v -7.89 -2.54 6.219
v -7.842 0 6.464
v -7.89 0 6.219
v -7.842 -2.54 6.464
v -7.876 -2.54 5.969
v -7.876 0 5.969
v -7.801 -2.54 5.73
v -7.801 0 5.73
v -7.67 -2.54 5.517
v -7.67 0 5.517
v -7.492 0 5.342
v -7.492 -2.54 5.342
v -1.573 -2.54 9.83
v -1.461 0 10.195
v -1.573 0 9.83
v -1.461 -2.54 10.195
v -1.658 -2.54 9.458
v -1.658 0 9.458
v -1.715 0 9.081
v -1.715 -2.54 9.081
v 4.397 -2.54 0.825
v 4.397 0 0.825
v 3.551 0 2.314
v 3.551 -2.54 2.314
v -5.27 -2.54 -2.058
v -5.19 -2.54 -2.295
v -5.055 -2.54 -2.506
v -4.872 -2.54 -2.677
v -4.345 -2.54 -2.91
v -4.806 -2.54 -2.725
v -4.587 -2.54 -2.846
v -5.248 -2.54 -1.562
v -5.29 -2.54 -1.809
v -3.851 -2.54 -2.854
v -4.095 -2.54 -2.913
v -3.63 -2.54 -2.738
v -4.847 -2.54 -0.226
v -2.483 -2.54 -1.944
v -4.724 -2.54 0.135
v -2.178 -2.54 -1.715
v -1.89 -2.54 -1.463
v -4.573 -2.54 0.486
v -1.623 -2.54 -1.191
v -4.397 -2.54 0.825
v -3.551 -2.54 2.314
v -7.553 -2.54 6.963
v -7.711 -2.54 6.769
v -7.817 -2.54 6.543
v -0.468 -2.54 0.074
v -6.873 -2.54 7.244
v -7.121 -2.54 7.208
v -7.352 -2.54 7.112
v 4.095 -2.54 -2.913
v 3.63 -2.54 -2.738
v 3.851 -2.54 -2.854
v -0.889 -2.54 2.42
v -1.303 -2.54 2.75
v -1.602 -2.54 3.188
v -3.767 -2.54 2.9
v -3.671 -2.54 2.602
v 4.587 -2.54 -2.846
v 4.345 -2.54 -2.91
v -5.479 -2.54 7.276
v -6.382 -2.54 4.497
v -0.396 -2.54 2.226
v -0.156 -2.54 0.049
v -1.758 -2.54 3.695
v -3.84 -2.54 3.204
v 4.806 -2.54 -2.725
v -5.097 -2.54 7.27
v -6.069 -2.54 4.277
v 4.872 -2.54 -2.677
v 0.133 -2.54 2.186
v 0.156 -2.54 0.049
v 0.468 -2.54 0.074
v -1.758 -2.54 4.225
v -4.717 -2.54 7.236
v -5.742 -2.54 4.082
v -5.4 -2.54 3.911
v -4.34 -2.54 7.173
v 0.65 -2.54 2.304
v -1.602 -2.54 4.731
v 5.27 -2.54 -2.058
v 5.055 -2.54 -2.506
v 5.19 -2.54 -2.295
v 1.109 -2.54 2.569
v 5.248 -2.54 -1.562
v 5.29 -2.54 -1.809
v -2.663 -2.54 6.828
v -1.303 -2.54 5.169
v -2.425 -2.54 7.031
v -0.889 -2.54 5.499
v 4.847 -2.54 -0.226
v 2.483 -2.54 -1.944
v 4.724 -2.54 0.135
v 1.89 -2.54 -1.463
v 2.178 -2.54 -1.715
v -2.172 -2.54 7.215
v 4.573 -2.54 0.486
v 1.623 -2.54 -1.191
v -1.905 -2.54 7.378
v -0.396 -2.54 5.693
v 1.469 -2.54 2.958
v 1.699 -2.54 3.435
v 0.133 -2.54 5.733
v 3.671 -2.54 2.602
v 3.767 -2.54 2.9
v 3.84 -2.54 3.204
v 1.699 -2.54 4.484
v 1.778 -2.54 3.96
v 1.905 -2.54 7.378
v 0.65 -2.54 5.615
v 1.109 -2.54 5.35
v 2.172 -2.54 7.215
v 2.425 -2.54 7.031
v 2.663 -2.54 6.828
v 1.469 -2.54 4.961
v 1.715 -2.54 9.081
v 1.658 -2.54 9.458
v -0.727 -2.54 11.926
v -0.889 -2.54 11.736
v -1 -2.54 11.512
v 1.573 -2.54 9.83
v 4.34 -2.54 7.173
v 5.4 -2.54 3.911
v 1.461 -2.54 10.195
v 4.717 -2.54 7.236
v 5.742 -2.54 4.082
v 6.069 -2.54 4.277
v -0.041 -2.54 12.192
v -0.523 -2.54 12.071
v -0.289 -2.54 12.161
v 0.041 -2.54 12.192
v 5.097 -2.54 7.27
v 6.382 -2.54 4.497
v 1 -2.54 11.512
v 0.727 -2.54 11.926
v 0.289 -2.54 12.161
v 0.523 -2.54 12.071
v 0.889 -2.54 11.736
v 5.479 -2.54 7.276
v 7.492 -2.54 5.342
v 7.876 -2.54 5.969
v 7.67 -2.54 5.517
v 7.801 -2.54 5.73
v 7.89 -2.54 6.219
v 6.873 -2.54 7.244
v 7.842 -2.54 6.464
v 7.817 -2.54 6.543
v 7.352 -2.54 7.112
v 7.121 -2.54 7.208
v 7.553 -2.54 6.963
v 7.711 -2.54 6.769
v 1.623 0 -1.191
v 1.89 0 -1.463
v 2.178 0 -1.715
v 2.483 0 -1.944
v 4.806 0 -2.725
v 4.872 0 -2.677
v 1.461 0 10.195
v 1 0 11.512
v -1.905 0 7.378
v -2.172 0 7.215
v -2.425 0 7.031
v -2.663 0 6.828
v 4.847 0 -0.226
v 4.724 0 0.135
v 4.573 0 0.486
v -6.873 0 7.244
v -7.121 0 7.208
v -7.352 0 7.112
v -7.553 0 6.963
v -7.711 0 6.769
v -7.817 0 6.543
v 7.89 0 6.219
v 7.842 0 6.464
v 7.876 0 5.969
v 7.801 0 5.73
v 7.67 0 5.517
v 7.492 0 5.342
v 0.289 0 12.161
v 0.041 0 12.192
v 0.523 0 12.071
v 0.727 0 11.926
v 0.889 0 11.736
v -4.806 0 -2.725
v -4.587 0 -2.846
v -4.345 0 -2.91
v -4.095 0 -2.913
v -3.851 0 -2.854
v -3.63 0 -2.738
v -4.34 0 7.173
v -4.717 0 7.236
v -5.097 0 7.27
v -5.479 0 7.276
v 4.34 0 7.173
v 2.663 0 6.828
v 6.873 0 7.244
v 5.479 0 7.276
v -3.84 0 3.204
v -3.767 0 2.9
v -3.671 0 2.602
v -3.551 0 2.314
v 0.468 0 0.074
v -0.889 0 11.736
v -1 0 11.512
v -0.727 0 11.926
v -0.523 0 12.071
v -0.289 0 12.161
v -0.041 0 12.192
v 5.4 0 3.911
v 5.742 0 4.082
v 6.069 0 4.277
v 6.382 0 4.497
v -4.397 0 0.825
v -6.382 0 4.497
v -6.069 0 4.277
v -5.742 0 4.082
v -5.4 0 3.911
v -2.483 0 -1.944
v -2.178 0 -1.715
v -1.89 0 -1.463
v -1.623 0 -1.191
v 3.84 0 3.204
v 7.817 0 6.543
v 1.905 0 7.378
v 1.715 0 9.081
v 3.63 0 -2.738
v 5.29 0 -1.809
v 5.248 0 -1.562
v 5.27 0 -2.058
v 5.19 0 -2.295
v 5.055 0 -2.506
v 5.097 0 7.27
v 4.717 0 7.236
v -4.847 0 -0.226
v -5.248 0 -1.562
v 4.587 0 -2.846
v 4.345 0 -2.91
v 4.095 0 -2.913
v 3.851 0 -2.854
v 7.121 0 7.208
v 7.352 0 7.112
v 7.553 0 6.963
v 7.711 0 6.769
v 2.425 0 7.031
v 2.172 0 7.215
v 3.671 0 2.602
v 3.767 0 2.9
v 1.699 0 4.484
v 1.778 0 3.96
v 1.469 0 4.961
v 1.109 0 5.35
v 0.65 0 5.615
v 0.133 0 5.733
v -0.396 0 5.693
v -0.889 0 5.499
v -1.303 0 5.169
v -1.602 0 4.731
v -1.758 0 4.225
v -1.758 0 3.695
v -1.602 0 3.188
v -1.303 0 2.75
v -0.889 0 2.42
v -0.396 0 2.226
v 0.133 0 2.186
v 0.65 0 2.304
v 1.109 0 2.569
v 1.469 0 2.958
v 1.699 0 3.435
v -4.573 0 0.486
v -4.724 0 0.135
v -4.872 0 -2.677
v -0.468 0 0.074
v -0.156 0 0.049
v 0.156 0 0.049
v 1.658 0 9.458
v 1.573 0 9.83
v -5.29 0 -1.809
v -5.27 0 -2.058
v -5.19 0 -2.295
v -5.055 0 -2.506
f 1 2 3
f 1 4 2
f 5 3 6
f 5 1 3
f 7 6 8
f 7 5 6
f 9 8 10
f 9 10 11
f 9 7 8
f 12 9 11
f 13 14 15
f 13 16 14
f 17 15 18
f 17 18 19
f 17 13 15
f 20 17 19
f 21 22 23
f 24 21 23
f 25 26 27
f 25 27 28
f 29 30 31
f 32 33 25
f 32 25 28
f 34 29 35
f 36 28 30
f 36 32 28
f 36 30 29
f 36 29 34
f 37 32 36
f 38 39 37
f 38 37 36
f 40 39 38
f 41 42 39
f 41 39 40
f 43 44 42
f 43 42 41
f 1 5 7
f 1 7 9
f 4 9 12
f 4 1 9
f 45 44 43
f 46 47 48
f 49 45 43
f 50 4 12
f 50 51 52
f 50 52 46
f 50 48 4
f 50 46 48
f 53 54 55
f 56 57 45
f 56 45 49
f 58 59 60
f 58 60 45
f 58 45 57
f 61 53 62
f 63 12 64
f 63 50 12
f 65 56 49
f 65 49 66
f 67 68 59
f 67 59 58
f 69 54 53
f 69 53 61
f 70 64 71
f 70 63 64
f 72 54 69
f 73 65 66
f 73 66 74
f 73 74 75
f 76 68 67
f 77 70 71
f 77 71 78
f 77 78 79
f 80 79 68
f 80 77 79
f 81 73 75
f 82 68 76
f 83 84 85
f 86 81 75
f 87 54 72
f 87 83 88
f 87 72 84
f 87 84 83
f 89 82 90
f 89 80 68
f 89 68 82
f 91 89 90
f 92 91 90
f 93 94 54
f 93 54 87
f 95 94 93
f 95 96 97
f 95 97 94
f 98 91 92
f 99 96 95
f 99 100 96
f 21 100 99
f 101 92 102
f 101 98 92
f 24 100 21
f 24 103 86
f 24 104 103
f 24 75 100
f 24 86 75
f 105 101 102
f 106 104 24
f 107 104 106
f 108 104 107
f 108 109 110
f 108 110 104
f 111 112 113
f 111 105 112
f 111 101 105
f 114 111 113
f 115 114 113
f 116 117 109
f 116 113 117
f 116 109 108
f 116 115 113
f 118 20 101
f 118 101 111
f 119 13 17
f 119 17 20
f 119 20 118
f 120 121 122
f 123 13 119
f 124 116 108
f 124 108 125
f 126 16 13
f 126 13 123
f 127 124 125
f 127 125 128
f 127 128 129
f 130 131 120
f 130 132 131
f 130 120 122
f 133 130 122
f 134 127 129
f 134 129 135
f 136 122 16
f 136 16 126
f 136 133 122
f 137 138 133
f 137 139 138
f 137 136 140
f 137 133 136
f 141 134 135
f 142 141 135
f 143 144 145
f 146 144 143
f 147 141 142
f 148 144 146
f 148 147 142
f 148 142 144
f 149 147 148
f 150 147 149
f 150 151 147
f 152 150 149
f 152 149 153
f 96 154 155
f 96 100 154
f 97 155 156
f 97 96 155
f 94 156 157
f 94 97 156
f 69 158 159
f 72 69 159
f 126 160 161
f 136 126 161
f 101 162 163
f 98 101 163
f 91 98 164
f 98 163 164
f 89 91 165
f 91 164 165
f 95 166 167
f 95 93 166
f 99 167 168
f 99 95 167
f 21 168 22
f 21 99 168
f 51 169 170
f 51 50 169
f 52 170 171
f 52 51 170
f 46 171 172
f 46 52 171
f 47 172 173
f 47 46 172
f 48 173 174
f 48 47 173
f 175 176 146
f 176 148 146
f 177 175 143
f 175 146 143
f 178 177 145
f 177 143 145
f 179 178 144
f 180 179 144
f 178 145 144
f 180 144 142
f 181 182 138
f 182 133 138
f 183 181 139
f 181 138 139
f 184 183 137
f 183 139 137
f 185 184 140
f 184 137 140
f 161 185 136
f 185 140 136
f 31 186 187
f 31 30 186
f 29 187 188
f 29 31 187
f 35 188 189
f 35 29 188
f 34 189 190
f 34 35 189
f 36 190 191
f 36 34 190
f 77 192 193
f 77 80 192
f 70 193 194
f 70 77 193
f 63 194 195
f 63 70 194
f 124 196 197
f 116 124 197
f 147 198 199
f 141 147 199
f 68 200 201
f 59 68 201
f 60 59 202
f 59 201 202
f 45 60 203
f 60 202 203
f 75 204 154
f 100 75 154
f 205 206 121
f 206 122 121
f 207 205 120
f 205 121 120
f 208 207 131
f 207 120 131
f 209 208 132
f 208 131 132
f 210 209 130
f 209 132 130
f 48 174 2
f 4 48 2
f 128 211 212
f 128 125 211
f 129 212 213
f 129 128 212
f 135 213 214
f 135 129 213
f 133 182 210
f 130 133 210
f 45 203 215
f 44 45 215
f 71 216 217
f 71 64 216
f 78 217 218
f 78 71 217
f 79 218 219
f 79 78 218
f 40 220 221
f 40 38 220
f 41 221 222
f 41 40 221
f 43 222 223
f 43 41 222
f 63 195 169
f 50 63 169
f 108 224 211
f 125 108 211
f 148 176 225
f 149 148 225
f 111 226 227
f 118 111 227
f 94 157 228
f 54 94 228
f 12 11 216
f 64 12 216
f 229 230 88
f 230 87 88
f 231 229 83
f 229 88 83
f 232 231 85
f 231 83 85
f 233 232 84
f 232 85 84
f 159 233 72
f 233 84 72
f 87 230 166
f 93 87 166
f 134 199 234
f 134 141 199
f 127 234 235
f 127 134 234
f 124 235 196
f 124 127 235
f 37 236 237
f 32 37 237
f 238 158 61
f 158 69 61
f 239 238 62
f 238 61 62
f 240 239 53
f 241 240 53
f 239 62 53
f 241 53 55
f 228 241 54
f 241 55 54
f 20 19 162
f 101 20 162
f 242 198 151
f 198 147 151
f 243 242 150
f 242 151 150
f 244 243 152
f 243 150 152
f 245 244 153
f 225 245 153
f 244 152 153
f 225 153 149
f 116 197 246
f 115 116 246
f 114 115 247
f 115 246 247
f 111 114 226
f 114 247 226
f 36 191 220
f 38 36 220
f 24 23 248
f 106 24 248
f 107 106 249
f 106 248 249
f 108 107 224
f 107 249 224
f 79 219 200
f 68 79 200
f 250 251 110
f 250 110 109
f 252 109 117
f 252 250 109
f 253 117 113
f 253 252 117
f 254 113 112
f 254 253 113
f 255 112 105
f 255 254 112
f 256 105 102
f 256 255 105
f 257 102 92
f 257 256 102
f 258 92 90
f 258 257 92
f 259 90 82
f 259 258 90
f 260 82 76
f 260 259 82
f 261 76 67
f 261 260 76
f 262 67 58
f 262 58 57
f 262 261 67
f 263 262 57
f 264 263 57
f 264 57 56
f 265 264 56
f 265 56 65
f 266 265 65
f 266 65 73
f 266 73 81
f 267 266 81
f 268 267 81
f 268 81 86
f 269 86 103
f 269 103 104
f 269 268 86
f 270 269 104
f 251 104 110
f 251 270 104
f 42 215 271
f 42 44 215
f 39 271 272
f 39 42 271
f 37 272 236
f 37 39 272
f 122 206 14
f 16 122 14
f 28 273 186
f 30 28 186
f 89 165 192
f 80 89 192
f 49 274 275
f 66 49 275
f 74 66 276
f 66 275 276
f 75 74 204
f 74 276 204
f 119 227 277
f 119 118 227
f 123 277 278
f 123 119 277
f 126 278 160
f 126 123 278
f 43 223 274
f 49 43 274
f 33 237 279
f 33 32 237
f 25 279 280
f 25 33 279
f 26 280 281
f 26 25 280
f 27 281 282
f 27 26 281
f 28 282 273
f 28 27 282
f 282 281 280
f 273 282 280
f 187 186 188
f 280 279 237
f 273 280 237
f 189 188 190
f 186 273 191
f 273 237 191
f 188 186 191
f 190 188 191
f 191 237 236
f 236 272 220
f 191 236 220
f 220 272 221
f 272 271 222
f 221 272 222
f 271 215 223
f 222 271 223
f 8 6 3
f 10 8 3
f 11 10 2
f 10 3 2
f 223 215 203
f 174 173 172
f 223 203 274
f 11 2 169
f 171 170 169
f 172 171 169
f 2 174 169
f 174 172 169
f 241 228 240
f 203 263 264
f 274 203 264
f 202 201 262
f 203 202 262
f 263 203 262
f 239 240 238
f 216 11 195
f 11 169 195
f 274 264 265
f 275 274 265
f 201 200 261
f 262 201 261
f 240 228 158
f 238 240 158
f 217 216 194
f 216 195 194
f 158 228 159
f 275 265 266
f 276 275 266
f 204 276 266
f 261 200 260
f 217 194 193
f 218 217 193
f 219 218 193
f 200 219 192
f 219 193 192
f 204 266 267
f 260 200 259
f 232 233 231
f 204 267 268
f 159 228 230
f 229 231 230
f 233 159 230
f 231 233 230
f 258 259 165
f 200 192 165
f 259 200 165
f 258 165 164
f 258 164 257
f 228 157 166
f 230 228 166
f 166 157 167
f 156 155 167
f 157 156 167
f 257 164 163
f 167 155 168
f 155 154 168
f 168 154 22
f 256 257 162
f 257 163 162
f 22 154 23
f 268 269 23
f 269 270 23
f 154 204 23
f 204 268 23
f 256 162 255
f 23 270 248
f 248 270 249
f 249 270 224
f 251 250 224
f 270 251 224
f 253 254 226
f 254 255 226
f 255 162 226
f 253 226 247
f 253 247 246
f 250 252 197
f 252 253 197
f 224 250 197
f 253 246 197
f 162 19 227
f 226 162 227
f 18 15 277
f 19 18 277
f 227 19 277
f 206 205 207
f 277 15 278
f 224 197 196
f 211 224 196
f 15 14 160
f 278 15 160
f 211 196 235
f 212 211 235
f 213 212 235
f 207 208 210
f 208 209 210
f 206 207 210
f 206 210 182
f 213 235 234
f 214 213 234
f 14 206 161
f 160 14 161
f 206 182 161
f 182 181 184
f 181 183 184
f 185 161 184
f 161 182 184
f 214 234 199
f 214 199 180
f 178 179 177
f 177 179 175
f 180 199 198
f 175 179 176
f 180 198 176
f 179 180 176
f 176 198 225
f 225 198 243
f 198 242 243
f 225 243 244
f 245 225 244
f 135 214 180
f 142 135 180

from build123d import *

# Parameters (mm, degrees)
F0_R     = 1.778
F1_DEPTH = 2.54
F2_R     = 5.08
F3_R     = 1.016


# Not quite as in the source:
# - a feature names something its author has since deleted; it is built from what else it names


with BuildPart() as f1:
    # F0 (on Front) → F1 (new body)
    with BuildSketch(Plane.XZ):
        with BuildLine():
            Line((0.762, 12.192), (-0.762, 12.192))
            Line((-0.762, 12.192), (-1.651, 9.652))
            Line((-1.651, 9.652), (-1.905, 7.3780332745))
            ThreePointArc((-1.905, 7.3780332745), (0, 7.8729912016), (1.905, 7.3780332745))
            Line((1.905, 7.3780332745), (1.651, 9.652))
            Line((1.651, 9.652), (0.762, 12.192))
        make_face()
        with BuildLine():
            ThreePointArc((1.905, 7.3780332745), (0, 7.8729912016), (-1.905, 7.3780332745))
            ThreePointArc((-1.905, 7.3780332745), (-2.3002813477, 7.1255844849), (-2.6625230681, 6.8276605496))
            ThreePointArc((-2.6625230681, 6.8276605496), (-3.7219334042, 5.168848297), (-3.8398778167, 3.2041352225))
            ThreePointArc((-3.8398778167, 3.2041352225), (-3.7219334042, 2.7501893548), (-3.5505297519, 2.3136134471))
            ThreePointArc((-3.5505297519, 2.3136134471), (-2.3002813477, 0.793453167), (-0.4681750033, 0.0741516359))
            ThreePointArc((-0.4681750033, 0.0741516359), (0, 0.0460464502), (0.4681750033, 0.0741516359))
            ThreePointArc((0.4681750033, 0.0741516359), (2.3002813477, 0.793453167), (3.5505297519, 2.3136134471))
            ThreePointArc((3.5505297519, 2.3136134471), (3.7219334042, 2.7501893548), (3.8398778167, 3.2041352225))
            ThreePointArc((3.8398778167, 3.2041352225), (3.8950302821, 3.5800387384), (3.9134723757, 3.9595188259))
            ThreePointArc((3.9134723757, 3.9595188259), (3.5871281349, 5.5240563868), (2.6625230681, 6.8276605496))
            ThreePointArc((2.6625230681, 6.8276605496), (2.3002813477, 7.1255844849), (1.905, 7.3780332745))
        make_face()
        with Locations((0, 3.9595188259)):
            Circle(F0_R, mode=Mode.SUBTRACT)
        with BuildLine():
            ThreePointArc((-3.8398778167, 3.2041352225), (-3.7219334042, 5.168848297), (-2.6625230681, 6.8276605496))
            Line((-2.6625230681, 6.8276605496), (-4.9036842568, 7.2887865573))
            Line((-4.9036842568, 7.2887865573), (-7.5940839162, 7.22820048))
            Line((-7.5940839162, 7.22820048), (-8.0650258156, 5.7787903492))
            Line((-8.0650258156, 5.7787903492), (-5.9240583722, 4.1483979405))
            Line((-5.9240583722, 4.1483979405), (-3.8398778167, 3.2041352225))
        make_face()
        with BuildLine():
            Line((4.9036842568, 7.2887865573), (2.6625230681, 6.8276605496))
            ThreePointArc((2.6625230681, 6.8276605496), (3.5871281349, 5.5240563868), (3.9134723757, 3.9595188259))
            ThreePointArc((3.9134723757, 3.9595188259), (3.8950302821, 3.5800387384), (3.8398778167, 3.2041352225))
            Line((3.8398778167, 3.2041352225), (5.9240583722, 4.1483979405))
            Line((5.9240583722, 4.1483979405), (8.0650258156, 5.7787903492))
            Line((8.0650258156, 5.7787903492), (7.5940839162, 7.22820048))
            Line((7.5940839162, 7.22820048), (4.9036842568, 7.2887865573))
        make_face()
        with BuildLine():
            ThreePointArc((-0.4681750033, 0.0741516359), (-2.3002813477, 0.793453167), (-3.5505297519, 2.3136134471))
            Line((-3.5505297519, 2.3136134471), (-4.6816435408, 0.3246382675))
            Line((-4.6816435408, 0.3246382675), (-5.4554019736, -2.2528059875))
            Line((-5.4554019736, -2.2528059875), (-4.2224600742, -3.148590712))
            Line((-4.2224600742, -3.148590712), (-2.0102694254, -1.6162286356))
            Line((-2.0102694254, -1.6162286356), (-0.4681750033, 0.0741516359))
        make_face()
        with BuildLine():
            Line((4.6816435408, 0.3246382675), (3.5505297519, 2.3136134471))
            ThreePointArc((3.5505297519, 2.3136134471), (2.3002813477, 0.793453167), (0.4681750033, 0.0741516359))
            Line((0.4681750033, 0.0741516359), (2.0102694254, -1.6162286356))
            Line((2.0102694254, -1.6162286356), (4.2224600742, -3.148590712))
            Line((4.2224600742, -3.148590712), (5.4554019736, -2.2528059875))
            Line((5.4554019736, -2.2528059875), (4.6816435408, 0.3246382675))
        make_face()
    extrude(amount=F1_DEPTH)

    # F2
    f2_edges = [f1.edges().sort_by_distance(p)[0] for p in [
        (1.651, -1.27, 9.652),
        (-4.903684, -1.27, 7.288787),
        (-4.681644, -1.27, 0.324638),
        (2.010269, -1.27, -1.616229),
        (5.924058, -1.27, 4.148398),
        (-1.651, -1.27, 9.652),
        (-5.924058, -1.27, 4.148398),
        (-2.010269, -1.27, -1.616229),
        (4.681644, -1.27, 0.324638),
        (4.903684, -1.27, 7.288787),
    ]]
    fillet(f2_edges, radius=F2_R)

    # F3
    f3_edges = [f1.edges().sort_by_distance(p)[0] for p in [
        (0.762, -1.27, 12.192),
        (-0.762, -1.27, 12.192),
        (-7.594084, -1.27, 7.2282),
        (-8.065026, -1.27, 5.77879),
        (-5.455402, -1.27, -2.252806),
        (-4.22246, -1.27, -3.148591),
        (4.22246, -1.27, -3.148591),
        (5.455402, -1.27, -2.252806),
        (8.065026, -1.27, 5.77879),
        (7.594084, -1.27, 7.2282),
    ]]
    fillet(f3_edges, radius=F3_R)


solid = f1.part
